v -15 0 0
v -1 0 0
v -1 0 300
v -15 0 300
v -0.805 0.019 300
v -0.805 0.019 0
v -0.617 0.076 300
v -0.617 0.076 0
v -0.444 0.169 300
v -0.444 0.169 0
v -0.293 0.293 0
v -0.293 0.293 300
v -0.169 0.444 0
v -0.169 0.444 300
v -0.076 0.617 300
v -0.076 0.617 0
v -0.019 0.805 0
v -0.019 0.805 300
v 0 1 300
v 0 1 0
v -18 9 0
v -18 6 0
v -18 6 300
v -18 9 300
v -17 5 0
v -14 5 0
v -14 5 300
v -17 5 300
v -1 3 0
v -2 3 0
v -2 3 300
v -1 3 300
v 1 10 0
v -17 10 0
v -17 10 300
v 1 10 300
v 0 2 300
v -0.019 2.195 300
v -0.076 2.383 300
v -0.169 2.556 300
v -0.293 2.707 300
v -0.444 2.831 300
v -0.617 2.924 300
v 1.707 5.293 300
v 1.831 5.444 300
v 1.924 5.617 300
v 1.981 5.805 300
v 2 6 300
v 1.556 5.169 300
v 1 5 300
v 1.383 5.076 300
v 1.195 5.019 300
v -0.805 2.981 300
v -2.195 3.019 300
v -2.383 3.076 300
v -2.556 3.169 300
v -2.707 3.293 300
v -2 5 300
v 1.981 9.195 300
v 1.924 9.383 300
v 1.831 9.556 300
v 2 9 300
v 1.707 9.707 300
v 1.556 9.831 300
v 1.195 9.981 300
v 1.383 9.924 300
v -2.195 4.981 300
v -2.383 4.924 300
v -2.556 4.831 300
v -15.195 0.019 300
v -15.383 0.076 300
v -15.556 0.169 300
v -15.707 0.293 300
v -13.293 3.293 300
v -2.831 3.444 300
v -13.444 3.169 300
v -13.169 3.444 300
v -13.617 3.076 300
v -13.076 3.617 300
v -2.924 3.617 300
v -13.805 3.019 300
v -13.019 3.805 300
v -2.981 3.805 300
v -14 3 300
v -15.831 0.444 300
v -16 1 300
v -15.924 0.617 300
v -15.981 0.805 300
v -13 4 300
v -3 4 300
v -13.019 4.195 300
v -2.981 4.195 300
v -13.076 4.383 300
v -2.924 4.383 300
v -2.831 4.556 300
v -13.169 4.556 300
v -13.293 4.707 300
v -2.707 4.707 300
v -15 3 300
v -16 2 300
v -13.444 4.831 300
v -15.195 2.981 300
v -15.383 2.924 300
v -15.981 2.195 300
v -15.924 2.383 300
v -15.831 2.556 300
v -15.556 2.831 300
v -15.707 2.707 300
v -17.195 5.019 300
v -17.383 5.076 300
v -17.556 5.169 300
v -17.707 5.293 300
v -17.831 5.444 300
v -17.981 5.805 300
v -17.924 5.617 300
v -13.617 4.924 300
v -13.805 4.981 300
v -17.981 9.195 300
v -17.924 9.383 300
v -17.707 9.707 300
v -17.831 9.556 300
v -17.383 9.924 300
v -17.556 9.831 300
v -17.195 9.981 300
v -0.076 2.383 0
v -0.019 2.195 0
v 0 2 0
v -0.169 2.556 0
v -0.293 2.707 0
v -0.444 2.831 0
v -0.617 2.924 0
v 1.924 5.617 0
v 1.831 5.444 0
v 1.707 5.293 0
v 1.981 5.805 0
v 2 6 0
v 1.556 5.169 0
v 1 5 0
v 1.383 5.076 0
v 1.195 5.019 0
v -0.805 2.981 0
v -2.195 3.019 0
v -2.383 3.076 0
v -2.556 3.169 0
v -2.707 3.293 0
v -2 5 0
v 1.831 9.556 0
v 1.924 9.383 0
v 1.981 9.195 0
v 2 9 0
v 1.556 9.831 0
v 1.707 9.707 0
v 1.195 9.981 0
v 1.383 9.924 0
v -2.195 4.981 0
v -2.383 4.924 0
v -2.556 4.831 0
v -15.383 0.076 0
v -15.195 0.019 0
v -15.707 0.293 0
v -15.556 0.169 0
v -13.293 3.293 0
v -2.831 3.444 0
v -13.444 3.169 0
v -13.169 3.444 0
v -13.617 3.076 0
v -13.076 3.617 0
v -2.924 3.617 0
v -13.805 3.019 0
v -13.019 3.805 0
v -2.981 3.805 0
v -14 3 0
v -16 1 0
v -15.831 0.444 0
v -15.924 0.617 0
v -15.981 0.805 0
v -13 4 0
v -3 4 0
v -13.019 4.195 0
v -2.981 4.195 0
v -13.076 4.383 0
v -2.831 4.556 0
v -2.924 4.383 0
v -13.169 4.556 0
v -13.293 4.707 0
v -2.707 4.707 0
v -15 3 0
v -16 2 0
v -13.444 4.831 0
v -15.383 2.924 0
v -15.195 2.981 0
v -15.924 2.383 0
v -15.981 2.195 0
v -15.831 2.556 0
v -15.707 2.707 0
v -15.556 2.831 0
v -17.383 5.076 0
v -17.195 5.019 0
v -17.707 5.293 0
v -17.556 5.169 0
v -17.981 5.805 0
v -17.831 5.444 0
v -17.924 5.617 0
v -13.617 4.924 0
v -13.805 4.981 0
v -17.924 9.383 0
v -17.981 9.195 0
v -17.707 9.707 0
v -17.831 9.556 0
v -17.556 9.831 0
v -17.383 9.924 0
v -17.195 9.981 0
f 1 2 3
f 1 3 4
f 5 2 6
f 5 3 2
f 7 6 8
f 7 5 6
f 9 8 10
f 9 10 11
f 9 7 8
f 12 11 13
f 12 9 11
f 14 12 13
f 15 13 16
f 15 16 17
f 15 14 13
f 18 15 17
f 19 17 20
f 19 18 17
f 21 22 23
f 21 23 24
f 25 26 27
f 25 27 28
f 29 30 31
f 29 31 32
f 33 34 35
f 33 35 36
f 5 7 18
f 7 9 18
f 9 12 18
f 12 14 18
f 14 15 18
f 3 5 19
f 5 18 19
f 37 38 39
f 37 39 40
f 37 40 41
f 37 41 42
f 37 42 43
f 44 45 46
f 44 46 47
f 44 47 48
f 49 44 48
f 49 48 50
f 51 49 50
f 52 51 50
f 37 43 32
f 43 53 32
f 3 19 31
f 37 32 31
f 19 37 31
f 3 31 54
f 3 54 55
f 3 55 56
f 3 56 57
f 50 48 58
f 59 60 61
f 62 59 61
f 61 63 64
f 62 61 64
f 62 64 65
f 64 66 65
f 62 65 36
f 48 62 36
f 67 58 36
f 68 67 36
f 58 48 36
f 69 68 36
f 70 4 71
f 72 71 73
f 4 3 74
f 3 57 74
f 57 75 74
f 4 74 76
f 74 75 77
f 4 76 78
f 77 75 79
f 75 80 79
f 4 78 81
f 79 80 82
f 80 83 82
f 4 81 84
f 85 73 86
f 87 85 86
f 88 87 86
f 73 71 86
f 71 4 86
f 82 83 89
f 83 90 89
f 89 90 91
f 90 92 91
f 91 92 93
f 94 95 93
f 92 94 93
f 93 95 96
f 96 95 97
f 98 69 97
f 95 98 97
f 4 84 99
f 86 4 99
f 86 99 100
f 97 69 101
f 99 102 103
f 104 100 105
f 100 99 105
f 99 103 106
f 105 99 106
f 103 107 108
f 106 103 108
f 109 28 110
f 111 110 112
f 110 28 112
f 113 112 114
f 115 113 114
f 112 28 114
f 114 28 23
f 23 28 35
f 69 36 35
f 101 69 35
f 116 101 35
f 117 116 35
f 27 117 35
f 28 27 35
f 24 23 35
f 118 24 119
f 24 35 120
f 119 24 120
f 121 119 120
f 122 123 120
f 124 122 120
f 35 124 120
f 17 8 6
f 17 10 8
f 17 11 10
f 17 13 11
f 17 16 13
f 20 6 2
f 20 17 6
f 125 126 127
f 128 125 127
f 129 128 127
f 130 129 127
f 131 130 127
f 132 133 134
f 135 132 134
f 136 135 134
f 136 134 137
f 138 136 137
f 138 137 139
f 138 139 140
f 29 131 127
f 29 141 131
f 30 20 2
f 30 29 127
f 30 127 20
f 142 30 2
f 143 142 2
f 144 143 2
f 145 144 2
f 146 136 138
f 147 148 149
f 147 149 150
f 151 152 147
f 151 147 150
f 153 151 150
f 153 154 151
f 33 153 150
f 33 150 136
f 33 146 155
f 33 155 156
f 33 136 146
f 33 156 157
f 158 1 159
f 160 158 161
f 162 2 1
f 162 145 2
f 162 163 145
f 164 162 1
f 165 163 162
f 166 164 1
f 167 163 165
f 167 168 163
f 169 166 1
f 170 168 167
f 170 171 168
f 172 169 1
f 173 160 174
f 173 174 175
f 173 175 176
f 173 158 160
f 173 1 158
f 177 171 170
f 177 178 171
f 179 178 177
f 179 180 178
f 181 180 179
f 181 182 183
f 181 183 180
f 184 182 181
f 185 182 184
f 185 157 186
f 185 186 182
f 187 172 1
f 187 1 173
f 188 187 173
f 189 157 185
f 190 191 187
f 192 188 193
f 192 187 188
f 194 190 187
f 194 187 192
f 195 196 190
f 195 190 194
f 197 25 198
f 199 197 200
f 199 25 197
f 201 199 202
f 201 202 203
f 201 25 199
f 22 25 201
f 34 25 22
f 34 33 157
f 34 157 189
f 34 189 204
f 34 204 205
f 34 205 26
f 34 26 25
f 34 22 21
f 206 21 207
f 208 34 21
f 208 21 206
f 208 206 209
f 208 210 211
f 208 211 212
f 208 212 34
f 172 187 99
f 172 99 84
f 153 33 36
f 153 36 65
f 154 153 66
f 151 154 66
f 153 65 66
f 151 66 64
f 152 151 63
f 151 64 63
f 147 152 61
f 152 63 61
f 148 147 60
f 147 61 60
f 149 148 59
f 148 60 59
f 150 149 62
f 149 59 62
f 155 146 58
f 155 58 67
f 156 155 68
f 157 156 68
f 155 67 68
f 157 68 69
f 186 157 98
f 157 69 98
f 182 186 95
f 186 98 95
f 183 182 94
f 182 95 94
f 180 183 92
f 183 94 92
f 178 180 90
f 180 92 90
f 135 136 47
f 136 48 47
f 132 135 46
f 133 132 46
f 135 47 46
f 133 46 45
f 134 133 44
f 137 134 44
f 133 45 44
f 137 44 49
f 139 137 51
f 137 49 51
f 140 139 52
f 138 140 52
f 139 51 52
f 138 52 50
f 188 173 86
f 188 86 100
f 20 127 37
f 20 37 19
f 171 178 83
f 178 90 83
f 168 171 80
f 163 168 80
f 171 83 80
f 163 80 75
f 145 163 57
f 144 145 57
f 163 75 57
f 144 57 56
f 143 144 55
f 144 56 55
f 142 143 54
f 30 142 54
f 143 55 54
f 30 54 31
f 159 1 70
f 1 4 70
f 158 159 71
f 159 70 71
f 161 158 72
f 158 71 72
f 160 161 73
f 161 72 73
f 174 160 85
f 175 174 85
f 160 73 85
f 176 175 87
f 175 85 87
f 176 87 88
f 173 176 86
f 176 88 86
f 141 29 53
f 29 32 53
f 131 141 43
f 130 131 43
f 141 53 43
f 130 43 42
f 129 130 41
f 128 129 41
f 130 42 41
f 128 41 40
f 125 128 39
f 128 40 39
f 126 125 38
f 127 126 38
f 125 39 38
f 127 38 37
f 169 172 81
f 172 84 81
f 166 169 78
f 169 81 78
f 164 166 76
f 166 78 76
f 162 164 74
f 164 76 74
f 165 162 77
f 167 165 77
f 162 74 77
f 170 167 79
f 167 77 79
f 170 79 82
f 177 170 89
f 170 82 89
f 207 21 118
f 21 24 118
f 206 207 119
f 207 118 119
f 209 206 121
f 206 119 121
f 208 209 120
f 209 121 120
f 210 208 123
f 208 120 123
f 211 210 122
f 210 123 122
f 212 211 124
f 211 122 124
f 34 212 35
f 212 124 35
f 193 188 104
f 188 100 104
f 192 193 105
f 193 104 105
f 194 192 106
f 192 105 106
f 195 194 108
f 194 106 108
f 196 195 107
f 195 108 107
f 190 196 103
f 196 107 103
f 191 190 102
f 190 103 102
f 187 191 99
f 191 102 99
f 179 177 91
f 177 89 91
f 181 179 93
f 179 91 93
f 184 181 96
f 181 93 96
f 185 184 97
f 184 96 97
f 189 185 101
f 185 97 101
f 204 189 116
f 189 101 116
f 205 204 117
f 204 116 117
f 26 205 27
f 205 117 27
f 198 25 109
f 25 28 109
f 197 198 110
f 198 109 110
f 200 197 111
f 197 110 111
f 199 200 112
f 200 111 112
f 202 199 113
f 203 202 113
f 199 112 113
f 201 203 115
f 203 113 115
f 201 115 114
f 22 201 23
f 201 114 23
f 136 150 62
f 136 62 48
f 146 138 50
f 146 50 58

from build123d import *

# Parameters (mm, degrees)
BOSS_EXTRUDE1_DEPTH = 300
FILLET1_R           = 1


with BuildPart() as part:
    # Sketch1 → Boss-Extrude1 (new body)
    with BuildSketch(Plane.XY):
        Polygon((0, 0), (-16, 0), (-16, 3), (-13, 3), (-13, 5), (-18, 5), (-18, 10), (2, 10), (2, 5), (-3, 5), (-3, 3), (0, 3), align=None)
    extrude(amount=BOSS_EXTRUDE1_DEPTH)

    # Fillet1
    fillet1_edges = [part.edges().sort_by_distance(p)[0] for p in [
        (-13, 5, 150),
        (-13, 3, 150),
        (-3, 5, 150),
        (-3, 3, 150),
        (0, 0, 150),
        (0, 3, 150),
        (-16, 3, 150),
        (-16, 0, 150),
        (2, 5, 150),
        (-18, 5, 150),
        (2, 10, 150),
        (-18, 10, 150),
    ]]
    fillet(fillet1_edges, radius=FILLET1_R - 0.0001)  # a hair under: the kernel refuses the full size


solid = part.part
